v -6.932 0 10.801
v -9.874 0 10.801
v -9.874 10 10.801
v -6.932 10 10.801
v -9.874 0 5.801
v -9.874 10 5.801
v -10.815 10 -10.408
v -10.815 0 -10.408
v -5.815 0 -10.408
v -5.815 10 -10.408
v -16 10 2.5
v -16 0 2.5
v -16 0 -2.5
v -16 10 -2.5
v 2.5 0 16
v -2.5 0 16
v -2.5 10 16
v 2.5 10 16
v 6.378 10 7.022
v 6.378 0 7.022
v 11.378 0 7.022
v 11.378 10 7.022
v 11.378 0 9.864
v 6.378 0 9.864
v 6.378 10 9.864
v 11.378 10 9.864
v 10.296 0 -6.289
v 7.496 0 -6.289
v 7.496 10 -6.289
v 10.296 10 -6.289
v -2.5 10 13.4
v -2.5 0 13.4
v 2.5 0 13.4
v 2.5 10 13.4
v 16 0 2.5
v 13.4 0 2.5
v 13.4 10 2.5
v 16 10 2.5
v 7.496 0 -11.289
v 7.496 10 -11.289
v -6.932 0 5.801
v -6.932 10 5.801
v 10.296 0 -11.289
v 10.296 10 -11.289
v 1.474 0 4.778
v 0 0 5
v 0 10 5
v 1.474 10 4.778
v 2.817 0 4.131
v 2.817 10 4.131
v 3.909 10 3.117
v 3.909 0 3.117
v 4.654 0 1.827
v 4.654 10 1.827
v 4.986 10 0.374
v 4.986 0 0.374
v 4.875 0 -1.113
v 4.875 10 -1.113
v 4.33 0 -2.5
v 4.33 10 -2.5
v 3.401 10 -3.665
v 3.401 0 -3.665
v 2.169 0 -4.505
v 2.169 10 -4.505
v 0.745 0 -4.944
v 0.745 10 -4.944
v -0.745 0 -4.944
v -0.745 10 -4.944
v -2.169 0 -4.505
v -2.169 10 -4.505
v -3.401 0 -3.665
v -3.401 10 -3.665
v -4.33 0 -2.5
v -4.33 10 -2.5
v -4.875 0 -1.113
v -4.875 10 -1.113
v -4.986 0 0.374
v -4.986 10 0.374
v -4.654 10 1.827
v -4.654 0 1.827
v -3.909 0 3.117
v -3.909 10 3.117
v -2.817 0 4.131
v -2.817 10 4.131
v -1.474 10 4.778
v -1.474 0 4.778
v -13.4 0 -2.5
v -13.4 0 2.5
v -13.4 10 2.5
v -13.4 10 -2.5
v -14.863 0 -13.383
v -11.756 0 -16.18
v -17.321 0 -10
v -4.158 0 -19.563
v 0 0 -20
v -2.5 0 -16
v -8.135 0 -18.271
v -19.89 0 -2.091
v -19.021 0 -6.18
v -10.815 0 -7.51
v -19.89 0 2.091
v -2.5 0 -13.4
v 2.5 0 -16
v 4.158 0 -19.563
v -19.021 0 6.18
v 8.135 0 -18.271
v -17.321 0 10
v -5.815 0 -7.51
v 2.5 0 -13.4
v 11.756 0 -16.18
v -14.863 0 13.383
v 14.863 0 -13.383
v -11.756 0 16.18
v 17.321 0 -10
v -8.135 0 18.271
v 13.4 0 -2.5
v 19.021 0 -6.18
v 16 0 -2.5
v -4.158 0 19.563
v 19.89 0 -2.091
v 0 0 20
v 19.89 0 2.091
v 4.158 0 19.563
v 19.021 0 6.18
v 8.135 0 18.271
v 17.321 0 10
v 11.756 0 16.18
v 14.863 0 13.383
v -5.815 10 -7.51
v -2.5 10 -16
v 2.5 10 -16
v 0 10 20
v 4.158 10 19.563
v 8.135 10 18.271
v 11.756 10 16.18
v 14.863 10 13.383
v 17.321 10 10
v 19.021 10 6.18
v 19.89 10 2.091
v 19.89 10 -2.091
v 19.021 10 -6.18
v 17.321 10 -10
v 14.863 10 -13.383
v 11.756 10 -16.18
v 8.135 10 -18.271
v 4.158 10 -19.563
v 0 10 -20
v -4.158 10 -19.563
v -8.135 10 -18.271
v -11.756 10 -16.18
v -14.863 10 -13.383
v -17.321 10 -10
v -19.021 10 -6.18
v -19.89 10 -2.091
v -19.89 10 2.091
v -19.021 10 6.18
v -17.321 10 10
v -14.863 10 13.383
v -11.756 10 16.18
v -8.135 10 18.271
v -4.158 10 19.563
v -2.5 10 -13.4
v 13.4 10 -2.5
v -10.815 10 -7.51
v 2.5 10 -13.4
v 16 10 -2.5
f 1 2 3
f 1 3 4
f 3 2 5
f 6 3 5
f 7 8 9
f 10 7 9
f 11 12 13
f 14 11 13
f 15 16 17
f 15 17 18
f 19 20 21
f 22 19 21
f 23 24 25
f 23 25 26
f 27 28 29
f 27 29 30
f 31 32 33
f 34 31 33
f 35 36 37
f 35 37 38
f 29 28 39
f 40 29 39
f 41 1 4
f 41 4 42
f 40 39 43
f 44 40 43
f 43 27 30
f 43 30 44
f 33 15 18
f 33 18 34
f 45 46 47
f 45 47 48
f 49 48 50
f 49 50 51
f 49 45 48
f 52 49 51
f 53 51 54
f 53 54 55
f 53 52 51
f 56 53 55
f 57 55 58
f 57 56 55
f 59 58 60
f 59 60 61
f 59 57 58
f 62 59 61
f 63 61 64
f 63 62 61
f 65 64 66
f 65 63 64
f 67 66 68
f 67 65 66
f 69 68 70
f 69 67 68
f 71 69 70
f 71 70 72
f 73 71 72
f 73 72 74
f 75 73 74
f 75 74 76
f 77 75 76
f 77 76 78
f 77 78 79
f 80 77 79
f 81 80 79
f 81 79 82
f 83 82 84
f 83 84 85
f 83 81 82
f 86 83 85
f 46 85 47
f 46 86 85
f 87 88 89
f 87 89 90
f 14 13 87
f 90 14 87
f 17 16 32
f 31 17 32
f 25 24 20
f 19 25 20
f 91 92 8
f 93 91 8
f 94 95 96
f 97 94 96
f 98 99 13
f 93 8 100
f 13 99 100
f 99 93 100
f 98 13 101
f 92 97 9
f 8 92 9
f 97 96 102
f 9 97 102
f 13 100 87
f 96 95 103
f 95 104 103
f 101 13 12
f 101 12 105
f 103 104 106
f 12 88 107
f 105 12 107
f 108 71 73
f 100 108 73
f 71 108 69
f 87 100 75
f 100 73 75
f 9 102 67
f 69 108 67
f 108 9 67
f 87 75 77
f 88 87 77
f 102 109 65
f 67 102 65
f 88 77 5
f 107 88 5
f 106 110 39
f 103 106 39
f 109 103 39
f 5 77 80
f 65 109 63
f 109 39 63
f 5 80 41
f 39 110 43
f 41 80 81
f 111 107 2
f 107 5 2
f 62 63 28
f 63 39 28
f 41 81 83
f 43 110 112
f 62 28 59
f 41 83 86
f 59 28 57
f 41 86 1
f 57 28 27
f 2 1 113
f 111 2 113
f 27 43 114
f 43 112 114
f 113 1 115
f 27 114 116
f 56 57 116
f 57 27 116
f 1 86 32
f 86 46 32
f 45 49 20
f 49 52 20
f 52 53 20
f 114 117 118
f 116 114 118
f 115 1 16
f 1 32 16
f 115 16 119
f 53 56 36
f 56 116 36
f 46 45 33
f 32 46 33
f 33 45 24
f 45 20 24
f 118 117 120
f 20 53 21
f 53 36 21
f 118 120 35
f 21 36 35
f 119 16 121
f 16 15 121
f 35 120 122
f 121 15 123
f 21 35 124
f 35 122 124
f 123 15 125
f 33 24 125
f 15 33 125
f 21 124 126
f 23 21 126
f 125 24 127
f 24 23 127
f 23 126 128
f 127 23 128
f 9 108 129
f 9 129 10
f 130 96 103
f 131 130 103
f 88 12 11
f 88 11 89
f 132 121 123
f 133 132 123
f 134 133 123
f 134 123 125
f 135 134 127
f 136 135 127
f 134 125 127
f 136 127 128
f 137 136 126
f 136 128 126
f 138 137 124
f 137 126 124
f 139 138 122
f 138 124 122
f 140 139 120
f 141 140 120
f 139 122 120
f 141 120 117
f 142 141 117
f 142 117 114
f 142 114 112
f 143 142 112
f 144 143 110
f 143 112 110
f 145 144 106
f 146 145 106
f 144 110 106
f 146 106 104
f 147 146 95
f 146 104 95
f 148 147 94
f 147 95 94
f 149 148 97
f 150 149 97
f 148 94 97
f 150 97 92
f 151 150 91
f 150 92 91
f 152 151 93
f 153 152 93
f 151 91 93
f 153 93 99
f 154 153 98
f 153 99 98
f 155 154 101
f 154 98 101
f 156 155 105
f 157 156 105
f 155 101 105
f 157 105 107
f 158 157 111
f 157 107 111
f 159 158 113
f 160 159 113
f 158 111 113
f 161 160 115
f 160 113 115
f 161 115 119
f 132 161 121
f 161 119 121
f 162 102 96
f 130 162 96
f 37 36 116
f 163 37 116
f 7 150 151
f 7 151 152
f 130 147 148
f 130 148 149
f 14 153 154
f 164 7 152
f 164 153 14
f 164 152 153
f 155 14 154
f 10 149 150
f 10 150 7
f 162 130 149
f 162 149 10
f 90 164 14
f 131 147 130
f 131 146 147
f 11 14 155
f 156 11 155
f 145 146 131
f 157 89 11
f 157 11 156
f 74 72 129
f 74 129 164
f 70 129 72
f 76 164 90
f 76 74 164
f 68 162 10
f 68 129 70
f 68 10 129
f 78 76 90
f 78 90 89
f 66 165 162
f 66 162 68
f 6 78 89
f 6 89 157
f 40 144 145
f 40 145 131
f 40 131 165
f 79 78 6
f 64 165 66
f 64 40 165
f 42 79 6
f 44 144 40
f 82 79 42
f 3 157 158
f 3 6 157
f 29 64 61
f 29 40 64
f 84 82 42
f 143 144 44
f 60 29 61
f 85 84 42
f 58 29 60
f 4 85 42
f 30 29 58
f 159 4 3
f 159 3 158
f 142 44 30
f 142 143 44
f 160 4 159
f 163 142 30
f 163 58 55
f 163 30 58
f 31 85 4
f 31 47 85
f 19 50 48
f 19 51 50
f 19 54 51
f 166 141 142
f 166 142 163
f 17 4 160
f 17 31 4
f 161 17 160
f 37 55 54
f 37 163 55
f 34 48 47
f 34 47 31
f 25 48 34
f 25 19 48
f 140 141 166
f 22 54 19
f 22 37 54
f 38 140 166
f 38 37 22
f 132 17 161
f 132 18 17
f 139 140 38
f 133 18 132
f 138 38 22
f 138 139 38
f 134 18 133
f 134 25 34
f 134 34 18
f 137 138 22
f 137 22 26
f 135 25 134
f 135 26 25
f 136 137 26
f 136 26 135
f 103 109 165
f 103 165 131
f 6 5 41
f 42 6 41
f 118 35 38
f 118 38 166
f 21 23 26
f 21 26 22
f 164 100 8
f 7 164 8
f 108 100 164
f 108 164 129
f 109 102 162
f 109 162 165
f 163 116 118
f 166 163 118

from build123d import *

# Parameters (mm, degrees)
SKETCH_1_R      = 20
SKETCH_1_R_2    = 5
SKETCH_1_W      = 5
SKETCH_1_H      = 2.6
SKETCH_1_W_2    = 2.6
SKETCH_1_H_2    = 5
SKETCH_1_W_3    = 2.8
SKETCH_1_W_4    = 2.941603816
SKETCH_1_H_3    = 2.897870759
SKETCH_1_H_4    = 2.841528046
EXTRUDE_1_DEPTH = 10


with BuildPart() as part:
    # Эскиз1 → Бобышка-Вытянуть1 (new body)
    with BuildSketch(Plane(origin=(0, 0, 0), x_dir=(1, 0, 0), z_dir=(0, 1, 0))):
        with Locations(Location((0, 0, 0), (0, 0, 270))):
            Circle(SKETCH_1_R)
        with Locations(Location((0, 0, 0), (0, 0, 270))):
            Circle(SKETCH_1_R_2, mode=Mode.SUBTRACT)
        with Locations((0, -14.7)):
            Rectangle(SKETCH_1_W, SKETCH_1_H, mode=Mode.SUBTRACT)
        with Locations((-14.7, 0)):
            Rectangle(SKETCH_1_W_2, SKETCH_1_H_2, mode=Mode.SUBTRACT)
        with Locations((14.7, 0)):
            Rectangle(SKETCH_1_W_2, SKETCH_1_H_2, mode=Mode.SUBTRACT)
        with Locations((0, 14.7)):
            Rectangle(SKETCH_1_W, SKETCH_1_H, mode=Mode.SUBTRACT)
        with Locations((8.896405813, 8.788682263)):
            Rectangle(SKETCH_1_W_3, SKETCH_1_H_2, mode=Mode.SUBTRACT)
        with Locations((-8.402919516, -8.301171423)):
            Rectangle(SKETCH_1_W_4, SKETCH_1_H_2, mode=Mode.SUBTRACT)
        with Locations((-8.314700298, 8.958870068)):
            Rectangle(SKETCH_1_W, SKETCH_1_H_3, mode=Mode.SUBTRACT)
        with Locations((8.878230894, -8.443187871)):
            Rectangle(SKETCH_1_W, SKETCH_1_H_4, mode=Mode.SUBTRACT)
    extrude(amount=EXTRUDE_1_DEPTH)


solid = part.part
